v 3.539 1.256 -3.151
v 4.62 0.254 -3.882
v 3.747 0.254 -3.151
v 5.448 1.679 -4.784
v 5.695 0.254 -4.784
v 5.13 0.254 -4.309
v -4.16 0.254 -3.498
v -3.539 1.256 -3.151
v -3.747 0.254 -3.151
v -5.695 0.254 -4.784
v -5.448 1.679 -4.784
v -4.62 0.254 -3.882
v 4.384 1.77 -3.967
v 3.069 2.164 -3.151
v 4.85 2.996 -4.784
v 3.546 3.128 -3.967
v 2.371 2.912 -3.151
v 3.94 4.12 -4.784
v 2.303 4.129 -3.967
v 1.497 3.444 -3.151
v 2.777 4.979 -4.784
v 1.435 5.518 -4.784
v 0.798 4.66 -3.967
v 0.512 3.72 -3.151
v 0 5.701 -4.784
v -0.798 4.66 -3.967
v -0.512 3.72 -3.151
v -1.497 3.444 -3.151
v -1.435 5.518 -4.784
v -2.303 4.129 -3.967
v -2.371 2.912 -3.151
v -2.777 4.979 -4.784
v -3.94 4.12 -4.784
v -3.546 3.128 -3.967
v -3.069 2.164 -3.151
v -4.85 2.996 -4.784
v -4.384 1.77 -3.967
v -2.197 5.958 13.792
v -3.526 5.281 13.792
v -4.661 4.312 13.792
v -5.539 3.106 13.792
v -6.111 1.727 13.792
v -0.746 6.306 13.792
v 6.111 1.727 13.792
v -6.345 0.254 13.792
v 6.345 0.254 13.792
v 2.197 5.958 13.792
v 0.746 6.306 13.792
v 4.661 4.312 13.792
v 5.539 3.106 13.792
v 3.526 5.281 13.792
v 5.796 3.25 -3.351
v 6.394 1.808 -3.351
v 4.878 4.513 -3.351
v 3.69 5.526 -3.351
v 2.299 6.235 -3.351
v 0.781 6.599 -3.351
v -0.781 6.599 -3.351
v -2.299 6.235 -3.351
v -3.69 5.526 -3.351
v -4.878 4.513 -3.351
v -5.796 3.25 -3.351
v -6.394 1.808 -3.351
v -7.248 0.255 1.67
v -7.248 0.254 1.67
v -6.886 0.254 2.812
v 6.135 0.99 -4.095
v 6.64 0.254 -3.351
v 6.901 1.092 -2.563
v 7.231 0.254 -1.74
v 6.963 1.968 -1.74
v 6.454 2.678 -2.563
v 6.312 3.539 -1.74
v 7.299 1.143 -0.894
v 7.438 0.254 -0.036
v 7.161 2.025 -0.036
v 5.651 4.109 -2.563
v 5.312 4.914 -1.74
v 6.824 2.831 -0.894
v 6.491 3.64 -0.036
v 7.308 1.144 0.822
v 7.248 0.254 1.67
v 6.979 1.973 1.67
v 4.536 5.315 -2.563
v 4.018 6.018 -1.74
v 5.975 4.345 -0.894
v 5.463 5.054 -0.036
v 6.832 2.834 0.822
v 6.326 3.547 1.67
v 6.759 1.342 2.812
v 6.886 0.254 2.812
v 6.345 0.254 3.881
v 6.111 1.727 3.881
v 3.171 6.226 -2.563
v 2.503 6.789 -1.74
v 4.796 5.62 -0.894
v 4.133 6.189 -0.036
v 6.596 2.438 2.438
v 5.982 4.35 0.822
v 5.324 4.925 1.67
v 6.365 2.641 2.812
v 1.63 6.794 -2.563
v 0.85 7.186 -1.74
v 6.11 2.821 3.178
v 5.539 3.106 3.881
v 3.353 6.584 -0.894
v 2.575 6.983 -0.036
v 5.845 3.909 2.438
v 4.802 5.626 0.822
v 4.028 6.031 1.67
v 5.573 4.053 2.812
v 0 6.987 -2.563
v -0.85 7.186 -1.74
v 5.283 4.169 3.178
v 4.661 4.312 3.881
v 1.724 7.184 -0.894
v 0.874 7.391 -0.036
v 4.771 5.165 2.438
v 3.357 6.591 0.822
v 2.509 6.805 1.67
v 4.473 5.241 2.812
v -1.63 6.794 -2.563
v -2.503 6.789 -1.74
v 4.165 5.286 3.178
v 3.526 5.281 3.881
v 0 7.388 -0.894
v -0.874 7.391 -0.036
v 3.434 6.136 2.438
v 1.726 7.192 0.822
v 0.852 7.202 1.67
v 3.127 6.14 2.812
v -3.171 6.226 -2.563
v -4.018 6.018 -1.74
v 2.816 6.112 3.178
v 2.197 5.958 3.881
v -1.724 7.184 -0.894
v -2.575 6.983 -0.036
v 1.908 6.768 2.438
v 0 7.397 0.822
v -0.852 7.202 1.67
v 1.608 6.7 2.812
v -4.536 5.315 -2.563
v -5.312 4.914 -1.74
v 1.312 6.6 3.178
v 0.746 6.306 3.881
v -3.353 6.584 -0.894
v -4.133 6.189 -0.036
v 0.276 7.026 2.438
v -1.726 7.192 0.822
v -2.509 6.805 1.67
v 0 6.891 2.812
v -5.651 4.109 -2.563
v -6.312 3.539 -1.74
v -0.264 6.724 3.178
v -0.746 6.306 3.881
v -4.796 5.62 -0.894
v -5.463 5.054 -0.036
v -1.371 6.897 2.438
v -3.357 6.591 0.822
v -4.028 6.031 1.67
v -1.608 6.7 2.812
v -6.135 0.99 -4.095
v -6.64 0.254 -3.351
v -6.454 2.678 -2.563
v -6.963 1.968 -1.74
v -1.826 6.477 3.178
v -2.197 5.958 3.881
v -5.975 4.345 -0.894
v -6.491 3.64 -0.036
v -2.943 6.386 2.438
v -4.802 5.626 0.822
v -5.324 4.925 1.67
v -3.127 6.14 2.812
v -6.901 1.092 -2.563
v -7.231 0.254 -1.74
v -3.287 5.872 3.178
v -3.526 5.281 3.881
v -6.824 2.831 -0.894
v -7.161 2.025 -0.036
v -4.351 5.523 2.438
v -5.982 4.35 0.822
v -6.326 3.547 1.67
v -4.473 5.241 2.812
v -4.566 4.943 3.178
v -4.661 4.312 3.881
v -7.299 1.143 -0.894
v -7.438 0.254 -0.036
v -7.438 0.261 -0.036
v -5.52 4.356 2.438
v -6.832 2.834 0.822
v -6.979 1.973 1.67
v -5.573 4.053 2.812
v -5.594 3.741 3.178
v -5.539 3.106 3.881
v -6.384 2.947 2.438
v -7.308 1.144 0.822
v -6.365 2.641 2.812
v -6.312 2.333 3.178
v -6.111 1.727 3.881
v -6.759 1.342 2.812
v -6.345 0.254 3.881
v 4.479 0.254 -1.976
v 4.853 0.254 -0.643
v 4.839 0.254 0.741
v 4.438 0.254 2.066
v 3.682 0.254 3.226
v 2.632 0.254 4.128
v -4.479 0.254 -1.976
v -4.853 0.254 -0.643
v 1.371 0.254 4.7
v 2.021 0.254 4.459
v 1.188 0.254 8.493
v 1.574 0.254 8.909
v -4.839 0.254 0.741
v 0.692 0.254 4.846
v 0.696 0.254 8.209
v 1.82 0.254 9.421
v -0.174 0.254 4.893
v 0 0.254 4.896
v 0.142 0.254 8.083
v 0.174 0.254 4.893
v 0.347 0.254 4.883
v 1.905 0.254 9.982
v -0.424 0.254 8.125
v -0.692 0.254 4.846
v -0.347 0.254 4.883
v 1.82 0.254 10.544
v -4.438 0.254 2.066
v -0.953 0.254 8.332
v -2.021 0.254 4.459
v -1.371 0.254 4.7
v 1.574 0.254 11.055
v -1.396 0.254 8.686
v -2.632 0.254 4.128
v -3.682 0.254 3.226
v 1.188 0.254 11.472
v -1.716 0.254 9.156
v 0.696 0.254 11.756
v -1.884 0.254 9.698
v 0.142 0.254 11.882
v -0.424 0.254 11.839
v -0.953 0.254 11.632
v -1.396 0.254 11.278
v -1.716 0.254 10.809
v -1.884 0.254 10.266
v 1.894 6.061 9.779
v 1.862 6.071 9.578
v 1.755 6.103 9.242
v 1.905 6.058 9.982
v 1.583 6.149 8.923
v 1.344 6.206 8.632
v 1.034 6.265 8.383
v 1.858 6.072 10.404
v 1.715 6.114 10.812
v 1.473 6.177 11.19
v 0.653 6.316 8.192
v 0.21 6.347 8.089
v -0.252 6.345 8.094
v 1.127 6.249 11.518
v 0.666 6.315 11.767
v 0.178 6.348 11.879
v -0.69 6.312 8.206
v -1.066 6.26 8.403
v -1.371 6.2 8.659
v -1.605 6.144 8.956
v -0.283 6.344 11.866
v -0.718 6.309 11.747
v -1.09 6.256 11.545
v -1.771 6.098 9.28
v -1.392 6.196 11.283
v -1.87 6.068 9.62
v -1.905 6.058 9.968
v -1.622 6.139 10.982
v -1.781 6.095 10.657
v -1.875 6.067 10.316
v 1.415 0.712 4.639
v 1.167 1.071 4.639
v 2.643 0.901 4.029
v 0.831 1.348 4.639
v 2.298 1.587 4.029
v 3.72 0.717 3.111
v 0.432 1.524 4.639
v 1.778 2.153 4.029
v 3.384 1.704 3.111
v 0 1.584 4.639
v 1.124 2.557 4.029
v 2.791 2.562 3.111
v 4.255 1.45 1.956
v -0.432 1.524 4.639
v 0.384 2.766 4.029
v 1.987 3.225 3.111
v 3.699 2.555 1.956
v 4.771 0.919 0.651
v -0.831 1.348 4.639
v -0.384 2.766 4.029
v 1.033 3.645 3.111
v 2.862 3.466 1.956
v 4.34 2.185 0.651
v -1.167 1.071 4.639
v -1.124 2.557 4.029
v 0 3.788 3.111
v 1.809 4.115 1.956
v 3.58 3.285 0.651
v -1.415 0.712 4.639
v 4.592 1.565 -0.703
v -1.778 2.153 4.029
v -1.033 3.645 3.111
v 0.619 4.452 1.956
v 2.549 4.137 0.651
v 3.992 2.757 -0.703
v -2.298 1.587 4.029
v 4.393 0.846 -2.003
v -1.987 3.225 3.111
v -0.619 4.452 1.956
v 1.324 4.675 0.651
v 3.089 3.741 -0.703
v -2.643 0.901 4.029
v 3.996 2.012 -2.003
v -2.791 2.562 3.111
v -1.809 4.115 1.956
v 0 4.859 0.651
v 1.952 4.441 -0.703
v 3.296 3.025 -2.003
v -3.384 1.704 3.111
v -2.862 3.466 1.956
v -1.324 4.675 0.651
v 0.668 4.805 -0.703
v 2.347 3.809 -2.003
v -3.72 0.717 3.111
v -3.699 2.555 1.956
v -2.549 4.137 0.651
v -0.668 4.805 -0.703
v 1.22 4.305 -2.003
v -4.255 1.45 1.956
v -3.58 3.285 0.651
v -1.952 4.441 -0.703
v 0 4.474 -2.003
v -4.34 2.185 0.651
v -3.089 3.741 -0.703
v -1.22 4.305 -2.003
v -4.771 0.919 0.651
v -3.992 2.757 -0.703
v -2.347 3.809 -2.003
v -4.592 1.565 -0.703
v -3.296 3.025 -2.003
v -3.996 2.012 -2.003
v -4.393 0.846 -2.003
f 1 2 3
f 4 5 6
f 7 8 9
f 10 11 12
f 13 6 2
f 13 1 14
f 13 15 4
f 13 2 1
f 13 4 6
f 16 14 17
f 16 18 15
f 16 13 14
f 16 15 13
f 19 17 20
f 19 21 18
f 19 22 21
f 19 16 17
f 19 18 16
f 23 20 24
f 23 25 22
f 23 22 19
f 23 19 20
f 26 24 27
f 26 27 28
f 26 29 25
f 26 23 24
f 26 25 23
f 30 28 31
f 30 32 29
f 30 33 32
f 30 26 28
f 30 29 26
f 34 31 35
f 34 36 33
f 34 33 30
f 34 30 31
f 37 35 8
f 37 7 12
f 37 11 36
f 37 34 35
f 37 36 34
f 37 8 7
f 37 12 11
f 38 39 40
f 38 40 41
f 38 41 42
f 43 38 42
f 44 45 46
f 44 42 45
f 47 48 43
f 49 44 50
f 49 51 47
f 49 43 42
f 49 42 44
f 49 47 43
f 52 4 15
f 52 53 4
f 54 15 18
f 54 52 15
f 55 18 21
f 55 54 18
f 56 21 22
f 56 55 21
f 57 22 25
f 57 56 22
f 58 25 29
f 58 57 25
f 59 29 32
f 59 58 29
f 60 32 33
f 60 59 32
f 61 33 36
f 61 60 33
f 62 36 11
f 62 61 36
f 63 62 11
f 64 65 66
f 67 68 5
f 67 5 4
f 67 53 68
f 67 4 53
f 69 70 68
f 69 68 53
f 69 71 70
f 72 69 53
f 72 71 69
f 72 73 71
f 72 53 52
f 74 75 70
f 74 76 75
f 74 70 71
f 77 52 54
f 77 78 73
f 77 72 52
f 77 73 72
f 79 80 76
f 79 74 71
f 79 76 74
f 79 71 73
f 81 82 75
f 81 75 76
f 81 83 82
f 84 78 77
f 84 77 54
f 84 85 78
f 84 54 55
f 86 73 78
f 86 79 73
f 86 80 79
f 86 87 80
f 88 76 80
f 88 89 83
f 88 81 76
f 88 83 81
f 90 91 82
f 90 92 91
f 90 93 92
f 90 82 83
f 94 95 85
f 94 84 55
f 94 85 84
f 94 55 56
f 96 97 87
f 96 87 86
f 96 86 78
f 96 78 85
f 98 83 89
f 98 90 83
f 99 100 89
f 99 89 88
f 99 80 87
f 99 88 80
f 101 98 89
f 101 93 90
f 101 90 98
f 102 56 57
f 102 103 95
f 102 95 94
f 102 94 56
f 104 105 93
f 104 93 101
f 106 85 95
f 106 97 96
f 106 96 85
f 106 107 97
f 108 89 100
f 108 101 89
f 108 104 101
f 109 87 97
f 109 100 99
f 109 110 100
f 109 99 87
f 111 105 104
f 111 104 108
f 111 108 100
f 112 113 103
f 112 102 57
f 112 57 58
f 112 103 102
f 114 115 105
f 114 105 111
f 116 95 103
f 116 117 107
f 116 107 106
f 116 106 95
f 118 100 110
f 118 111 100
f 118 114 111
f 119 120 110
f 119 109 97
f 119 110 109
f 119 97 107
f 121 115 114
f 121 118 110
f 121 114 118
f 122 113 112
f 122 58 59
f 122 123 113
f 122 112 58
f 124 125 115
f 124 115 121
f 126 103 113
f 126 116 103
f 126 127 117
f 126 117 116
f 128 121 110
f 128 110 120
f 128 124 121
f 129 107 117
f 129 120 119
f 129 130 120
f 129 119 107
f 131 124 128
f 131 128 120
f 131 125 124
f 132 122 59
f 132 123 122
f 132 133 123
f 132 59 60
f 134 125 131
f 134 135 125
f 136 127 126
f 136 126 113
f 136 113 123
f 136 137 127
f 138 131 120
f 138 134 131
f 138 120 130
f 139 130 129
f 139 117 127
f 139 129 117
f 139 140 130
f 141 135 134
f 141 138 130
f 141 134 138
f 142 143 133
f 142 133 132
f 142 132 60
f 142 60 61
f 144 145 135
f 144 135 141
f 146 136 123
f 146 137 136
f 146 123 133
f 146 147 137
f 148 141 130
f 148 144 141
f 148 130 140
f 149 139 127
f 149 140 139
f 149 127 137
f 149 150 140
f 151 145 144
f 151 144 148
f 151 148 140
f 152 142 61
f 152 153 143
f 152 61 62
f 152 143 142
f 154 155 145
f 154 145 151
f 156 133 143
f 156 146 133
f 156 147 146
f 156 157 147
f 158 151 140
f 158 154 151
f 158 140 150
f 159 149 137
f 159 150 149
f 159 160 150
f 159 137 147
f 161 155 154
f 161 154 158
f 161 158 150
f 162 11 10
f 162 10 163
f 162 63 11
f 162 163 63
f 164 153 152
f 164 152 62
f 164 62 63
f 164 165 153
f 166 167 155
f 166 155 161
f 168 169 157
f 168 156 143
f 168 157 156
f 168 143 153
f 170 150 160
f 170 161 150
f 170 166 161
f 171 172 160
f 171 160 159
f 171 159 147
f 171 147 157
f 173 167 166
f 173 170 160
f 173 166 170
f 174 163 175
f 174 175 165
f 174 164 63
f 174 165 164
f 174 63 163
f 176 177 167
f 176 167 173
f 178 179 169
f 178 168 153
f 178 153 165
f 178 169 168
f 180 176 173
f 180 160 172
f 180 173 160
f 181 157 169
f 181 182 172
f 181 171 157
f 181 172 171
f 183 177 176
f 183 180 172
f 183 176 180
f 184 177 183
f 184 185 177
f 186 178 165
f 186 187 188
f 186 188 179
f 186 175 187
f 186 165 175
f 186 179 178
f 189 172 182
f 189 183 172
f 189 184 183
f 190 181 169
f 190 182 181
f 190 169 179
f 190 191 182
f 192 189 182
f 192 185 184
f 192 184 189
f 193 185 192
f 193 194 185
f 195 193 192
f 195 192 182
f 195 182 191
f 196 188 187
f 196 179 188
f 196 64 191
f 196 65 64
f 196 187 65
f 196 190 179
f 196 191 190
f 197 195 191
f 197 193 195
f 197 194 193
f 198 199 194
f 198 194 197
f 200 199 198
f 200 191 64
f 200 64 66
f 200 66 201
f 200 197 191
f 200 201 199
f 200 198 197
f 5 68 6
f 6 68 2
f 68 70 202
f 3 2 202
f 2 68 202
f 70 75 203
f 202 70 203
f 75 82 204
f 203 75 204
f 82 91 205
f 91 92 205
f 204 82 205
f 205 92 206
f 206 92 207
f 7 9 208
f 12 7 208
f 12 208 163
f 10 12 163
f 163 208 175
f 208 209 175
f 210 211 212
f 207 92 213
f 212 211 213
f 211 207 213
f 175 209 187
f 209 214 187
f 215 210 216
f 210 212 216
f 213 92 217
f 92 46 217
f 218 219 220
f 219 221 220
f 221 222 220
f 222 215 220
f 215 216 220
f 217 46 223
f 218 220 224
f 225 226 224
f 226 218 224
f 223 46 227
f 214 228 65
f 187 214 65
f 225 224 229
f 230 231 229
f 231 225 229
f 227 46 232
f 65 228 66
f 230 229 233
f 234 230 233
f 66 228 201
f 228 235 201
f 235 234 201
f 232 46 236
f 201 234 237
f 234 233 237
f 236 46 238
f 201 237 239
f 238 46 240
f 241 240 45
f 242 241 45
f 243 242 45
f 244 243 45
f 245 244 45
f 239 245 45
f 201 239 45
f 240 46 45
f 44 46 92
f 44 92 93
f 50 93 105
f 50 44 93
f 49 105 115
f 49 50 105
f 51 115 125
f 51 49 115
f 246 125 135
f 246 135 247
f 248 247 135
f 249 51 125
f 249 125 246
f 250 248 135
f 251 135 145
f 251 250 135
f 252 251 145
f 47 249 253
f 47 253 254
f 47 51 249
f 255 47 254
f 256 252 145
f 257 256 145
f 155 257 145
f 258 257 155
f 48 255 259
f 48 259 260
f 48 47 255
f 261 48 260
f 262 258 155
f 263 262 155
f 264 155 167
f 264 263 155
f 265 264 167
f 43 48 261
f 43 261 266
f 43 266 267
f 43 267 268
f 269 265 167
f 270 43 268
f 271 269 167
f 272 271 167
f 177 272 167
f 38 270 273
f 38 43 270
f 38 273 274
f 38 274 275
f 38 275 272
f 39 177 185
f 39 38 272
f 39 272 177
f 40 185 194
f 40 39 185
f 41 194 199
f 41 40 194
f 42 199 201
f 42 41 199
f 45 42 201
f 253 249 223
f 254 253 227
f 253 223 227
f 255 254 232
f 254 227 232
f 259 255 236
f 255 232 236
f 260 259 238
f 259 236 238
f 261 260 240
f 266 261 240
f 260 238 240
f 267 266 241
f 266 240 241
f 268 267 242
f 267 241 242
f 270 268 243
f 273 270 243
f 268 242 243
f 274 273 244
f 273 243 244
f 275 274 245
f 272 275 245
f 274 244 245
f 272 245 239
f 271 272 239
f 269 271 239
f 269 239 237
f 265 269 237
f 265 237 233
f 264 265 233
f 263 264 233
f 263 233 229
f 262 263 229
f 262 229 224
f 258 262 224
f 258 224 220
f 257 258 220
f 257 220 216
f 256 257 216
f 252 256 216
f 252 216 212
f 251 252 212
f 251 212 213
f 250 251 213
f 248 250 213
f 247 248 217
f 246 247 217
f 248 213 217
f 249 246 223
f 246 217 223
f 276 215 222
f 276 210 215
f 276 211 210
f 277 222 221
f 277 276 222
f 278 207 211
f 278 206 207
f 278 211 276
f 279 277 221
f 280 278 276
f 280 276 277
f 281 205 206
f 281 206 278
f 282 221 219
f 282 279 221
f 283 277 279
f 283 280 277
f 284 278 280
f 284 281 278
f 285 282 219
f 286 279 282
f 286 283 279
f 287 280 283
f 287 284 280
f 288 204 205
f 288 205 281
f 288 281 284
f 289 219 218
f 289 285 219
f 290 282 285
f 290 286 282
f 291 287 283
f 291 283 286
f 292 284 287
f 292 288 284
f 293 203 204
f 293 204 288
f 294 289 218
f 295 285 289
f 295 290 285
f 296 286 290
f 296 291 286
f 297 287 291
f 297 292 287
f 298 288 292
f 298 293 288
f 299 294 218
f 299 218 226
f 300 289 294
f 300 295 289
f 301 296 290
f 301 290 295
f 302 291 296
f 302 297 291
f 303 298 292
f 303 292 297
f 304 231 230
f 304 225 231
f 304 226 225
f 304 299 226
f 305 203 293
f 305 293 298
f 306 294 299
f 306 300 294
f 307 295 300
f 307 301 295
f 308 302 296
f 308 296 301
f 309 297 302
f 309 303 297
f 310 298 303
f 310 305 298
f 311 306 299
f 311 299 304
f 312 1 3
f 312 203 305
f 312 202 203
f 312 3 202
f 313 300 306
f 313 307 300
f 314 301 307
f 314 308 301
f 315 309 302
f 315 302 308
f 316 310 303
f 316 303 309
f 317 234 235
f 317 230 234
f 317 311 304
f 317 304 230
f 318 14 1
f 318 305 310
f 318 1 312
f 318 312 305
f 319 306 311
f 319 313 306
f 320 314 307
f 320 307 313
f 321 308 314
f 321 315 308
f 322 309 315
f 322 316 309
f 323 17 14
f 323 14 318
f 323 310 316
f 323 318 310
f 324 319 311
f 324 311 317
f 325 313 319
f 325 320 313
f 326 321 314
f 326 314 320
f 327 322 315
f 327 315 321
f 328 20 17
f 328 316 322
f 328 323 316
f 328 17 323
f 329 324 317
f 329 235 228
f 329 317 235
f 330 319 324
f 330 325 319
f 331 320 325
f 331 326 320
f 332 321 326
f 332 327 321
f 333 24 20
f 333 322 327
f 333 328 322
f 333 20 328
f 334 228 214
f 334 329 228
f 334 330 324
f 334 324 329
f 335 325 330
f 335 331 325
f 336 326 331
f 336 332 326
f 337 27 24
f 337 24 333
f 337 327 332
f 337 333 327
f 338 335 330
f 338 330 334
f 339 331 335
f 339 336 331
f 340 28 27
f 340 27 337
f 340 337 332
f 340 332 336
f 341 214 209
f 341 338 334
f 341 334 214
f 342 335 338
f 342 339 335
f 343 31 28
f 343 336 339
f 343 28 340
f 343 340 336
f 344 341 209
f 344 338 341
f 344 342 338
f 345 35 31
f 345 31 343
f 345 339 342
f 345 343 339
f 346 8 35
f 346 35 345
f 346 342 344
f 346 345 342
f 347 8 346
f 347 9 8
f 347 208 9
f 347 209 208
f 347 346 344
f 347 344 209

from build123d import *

# Parameters (mm, degrees)
F1_ANGLE = 180
F3_R     = 1.905
F4_DEPTH = 7.4432
F6_DEPTH = 18.576954


with BuildPart() as f1:
    # F0 (on Front) → F1 (revolve)
    with BuildSketch(Plane.XZ):
        with BuildLine():
            ThreePointArc((0, 4.9022), (4.442902, 2.071759), (3.755303, -3.151073))
            Line((3.755303, -3.151073), (5.701056, -4.783754))
            ThreePointArc((5.701056, -4.783754), (7.421416, -0.555811), (6.35, 3.881216))
            Line((6.35, 3.881216), (6.35, 7.3025))
            Line((6.35, 7.3025), (6.35, 13.7922))
            Line((6.35, 13.7922), (0, 13.7922))
            Line((0, 13.7922), (0, 7.4422))
            Line((0, 7.4422), (0, 4.9022))
        make_face()
    revolve(axis=Axis((0, 0, 10.6172), (0, 0, 1)), revolution_arc=F1_ANGLE)

    # F3 (on face) → F4 (cut, through all)
    with BuildSketch(Plane.XZ):
        with Locations((0, 9.9822)):
            Circle(F3_R)
    extrude(amount=-F4_DEPTH, mode=Mode.SUBTRACT)

    # F5 (on face) → F6 (cut, through all)
    with BuildSketch(Plane.XY.offset(13.7922)):
        with BuildLine():
            ThreePointArc((-6.344918, 0.254), (-6.348729, 0.127025), (-6.35, 0))
            Line((-6.35, 0), (6.35, 0))
            ThreePointArc((6.35, 0), (6.348729, 0.127025), (6.344918, 0.254))
            Line((6.344918, 0.254), (-6.344918, 0.254))
        make_face()
        with BuildLine():
            Line((-9.525, 0.254), (-9.525, 0))
            Line((-9.525, 0), (-6.35, 0))
            ThreePointArc((-6.35, 0), (-6.348729, 0.127025), (-6.344918, 0.254))
            Line((-6.344918, 0.254), (-9.525, 0.254))
        make_face()
        with BuildLine():
            ThreePointArc((6.344918, 0.254), (6.348729, 0.127025), (6.35, 0))
            Line((6.35, 0), (9.525, 0))
            Line((9.525, 0), (9.525, 0.254))
            Line((9.525, 0.254), (6.344918, 0.254))
        make_face()
    extrude(amount=-F6_DEPTH, mode=Mode.SUBTRACT)


solid = f1.part
